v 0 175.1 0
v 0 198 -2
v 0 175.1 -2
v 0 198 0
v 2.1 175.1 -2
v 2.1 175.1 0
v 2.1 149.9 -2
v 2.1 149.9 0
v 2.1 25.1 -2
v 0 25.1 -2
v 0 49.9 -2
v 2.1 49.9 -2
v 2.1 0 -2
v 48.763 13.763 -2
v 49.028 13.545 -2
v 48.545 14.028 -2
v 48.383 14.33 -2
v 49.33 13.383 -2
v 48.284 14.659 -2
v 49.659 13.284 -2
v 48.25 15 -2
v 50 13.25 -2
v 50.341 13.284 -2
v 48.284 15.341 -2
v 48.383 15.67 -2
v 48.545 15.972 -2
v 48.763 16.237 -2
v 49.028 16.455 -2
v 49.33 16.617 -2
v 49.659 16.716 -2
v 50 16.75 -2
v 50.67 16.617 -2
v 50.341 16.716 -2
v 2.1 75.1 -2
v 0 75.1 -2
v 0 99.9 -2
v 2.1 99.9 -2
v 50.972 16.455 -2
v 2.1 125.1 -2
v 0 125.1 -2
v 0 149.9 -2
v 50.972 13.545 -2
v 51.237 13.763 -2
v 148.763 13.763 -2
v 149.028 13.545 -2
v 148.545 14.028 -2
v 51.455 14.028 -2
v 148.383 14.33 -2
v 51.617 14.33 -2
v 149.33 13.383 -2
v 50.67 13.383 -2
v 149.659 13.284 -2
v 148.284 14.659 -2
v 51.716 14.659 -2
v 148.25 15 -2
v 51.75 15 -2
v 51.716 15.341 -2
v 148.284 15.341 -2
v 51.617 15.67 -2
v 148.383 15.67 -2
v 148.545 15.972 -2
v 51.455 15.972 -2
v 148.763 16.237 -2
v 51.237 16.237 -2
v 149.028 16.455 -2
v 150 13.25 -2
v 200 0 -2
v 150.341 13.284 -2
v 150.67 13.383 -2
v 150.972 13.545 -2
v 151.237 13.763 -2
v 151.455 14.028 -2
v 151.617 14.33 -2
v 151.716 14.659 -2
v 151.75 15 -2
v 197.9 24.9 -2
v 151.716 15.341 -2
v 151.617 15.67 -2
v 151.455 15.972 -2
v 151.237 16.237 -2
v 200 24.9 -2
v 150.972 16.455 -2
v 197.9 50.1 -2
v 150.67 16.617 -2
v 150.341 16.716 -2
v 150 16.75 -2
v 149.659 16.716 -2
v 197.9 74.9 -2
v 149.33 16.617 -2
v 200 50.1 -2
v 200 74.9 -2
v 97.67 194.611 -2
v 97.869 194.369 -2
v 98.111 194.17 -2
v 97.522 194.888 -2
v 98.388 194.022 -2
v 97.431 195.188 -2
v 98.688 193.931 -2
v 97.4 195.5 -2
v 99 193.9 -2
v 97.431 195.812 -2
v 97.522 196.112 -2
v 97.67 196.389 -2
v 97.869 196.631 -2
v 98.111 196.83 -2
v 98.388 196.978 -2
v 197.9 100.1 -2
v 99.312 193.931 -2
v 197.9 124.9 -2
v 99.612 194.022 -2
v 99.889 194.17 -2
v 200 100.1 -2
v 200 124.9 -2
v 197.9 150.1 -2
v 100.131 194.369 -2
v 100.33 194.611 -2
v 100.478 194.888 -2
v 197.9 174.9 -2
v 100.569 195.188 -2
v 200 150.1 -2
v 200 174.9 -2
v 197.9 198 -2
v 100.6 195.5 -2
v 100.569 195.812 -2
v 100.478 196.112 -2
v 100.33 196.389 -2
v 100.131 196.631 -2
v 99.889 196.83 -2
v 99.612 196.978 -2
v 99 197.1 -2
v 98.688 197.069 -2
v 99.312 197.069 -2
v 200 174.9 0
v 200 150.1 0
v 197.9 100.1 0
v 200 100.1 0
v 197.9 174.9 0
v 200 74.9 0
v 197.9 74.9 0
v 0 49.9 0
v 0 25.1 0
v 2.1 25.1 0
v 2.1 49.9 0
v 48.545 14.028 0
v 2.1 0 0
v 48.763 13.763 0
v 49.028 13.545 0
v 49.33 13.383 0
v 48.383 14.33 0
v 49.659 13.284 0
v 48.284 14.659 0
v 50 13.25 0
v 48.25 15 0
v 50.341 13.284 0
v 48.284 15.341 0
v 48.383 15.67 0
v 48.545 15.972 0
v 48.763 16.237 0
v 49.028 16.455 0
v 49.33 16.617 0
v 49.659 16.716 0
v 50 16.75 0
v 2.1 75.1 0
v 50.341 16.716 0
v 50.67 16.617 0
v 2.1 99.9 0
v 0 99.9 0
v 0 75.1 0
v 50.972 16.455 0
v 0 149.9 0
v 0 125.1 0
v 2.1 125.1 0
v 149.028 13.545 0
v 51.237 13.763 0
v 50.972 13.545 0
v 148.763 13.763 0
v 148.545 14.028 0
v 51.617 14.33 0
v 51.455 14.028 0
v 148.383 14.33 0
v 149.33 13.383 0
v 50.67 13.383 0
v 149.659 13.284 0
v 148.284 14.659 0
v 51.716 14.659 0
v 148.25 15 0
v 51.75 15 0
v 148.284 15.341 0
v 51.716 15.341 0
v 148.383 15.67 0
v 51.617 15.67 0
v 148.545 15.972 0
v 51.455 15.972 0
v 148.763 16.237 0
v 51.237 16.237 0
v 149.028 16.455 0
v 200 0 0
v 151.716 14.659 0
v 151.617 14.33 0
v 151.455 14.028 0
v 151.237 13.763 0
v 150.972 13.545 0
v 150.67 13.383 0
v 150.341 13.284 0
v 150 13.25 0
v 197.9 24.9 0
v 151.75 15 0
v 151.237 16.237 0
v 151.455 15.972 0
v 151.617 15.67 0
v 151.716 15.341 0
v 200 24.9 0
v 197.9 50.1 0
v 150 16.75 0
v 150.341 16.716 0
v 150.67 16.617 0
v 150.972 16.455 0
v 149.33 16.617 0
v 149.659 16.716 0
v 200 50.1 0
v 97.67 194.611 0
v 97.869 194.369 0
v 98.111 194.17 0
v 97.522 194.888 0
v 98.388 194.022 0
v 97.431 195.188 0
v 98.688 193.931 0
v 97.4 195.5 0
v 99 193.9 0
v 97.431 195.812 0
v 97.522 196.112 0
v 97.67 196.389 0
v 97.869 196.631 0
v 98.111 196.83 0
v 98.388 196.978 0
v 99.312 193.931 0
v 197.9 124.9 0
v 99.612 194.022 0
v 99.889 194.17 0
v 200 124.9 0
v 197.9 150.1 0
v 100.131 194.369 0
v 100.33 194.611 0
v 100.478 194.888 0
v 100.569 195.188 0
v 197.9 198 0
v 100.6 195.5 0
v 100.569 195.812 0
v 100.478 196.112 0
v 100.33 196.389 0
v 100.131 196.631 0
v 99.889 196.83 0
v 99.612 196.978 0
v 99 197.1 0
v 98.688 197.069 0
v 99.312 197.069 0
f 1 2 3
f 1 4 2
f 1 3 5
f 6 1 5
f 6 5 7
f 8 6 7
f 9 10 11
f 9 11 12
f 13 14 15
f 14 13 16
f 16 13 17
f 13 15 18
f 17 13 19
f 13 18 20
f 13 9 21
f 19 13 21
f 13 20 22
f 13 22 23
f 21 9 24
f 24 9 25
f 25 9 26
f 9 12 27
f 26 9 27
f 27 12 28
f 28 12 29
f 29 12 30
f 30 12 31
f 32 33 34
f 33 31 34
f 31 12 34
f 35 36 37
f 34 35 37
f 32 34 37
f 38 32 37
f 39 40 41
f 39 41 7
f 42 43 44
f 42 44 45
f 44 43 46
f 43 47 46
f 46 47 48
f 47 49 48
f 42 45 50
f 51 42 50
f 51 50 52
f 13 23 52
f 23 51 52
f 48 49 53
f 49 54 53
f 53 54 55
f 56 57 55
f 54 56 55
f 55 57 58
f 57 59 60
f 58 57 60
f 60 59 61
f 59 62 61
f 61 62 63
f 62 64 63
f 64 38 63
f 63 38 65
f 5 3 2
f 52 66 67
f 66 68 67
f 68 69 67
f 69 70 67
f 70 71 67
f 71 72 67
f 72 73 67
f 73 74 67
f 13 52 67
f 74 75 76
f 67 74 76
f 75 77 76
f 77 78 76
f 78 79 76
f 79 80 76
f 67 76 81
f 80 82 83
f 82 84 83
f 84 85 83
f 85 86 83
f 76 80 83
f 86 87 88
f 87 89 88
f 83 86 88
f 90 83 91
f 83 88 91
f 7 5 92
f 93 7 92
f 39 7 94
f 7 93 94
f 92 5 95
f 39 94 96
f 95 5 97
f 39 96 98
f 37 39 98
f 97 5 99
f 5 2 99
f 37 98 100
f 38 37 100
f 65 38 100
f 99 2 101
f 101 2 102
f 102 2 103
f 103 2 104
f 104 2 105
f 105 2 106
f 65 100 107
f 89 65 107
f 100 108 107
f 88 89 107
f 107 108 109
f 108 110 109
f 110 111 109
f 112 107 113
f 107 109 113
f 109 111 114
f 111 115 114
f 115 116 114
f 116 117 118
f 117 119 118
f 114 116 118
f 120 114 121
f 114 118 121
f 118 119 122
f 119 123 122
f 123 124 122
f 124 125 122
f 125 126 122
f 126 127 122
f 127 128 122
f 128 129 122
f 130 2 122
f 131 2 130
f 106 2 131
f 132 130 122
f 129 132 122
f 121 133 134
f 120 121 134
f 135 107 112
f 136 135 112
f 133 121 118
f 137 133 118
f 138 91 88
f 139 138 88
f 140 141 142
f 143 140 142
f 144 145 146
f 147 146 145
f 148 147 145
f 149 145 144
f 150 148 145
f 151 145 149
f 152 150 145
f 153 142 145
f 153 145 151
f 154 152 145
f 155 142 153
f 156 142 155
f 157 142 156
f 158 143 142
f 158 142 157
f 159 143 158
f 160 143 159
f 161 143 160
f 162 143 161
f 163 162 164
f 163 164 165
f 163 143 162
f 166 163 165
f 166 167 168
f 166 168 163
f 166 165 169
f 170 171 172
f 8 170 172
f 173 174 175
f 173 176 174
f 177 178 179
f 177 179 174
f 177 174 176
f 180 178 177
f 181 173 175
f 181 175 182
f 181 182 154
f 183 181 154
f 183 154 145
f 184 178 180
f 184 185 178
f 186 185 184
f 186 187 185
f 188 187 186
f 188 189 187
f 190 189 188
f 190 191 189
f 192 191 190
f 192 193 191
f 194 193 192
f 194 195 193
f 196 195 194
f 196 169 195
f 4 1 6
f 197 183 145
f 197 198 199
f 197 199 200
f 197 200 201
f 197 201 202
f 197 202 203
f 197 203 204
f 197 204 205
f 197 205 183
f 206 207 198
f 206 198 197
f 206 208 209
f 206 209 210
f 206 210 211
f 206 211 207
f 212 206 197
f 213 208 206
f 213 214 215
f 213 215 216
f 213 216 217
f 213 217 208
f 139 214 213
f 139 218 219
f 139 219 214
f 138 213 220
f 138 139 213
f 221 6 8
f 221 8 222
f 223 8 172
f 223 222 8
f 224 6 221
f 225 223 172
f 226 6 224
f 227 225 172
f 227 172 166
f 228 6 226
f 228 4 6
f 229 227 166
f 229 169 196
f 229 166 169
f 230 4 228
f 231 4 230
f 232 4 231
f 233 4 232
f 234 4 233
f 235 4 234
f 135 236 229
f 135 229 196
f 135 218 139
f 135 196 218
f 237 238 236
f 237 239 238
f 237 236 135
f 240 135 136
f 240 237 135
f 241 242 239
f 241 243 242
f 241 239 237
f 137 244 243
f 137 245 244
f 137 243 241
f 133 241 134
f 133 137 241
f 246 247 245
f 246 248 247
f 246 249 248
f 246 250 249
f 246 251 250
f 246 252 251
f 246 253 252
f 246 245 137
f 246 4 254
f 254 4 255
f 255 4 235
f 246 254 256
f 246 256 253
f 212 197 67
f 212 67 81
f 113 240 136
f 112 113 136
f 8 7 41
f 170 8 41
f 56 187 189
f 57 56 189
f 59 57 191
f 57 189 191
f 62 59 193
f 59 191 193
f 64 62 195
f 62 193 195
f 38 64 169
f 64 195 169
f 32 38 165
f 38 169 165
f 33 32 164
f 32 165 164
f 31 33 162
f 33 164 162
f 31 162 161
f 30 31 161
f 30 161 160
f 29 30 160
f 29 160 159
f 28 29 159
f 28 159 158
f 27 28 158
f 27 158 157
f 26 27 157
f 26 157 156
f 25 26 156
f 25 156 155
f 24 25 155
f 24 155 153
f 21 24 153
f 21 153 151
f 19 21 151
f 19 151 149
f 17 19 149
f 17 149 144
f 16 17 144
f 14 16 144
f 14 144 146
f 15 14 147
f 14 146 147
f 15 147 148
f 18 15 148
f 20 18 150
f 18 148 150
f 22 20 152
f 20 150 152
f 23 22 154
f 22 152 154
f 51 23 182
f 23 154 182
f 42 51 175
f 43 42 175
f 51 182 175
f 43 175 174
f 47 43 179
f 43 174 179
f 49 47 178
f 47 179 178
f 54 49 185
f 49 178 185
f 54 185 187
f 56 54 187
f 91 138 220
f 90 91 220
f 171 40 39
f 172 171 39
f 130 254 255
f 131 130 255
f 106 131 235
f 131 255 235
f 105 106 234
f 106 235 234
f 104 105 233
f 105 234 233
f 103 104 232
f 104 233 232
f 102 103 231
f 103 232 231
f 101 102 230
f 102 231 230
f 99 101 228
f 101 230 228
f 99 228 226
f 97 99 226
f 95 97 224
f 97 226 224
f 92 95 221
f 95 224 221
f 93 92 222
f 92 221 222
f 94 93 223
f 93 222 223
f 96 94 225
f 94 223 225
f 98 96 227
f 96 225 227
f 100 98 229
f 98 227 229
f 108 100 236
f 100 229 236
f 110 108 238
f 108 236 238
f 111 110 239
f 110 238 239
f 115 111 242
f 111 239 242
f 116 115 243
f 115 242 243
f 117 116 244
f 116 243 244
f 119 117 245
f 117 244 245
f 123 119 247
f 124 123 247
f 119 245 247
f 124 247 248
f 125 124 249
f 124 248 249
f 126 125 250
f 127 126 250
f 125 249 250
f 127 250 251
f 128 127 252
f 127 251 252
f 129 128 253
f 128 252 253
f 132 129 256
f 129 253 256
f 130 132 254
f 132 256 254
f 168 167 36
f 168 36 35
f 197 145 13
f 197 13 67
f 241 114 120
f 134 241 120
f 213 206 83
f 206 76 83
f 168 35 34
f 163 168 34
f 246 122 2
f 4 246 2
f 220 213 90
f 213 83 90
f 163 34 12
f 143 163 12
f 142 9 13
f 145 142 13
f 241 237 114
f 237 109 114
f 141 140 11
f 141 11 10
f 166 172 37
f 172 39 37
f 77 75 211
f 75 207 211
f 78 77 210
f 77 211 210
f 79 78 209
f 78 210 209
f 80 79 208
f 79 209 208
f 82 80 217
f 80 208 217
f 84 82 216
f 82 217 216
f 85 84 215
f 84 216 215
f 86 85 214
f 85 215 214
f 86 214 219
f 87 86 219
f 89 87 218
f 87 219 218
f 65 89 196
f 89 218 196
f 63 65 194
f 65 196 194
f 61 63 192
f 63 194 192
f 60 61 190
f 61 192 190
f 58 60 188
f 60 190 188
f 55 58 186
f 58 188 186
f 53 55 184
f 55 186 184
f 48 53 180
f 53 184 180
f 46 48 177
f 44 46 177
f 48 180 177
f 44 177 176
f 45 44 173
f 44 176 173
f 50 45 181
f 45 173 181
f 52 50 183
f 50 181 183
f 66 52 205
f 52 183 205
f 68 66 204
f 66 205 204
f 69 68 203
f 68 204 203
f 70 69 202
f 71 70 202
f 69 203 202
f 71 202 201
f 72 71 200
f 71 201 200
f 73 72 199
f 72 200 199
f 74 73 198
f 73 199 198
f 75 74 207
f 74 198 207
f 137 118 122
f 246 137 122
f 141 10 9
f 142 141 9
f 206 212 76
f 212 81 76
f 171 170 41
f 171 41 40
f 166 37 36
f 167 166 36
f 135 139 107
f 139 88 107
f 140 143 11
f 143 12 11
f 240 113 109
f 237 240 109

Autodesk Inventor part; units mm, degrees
ref_plane "YZ Plane" through (0, 0, 0) normal (1, 0, 0) x (0, 1, 0)
ref_plane "XZ Plane" through (0, 0, 0) normal (0, 1, 0) x (-1, 0, 0)
ref_plane "XY Plane" through (0, 0, 0) normal (0, 0, 1) x (1, 0, 0)
sketch "Boceto1" plane through (0, 0, 0) normal (0, 0, 1) x (1, 0, 0)
  line L0 (0, 200) -> (0, 175)
  line L1 (0, 175) -> (2, 175)
  line L2 (2, 175) -> (2, 150)
  line L3 (2, 150) -> (0, 150)
  line L4 (0, 150) -> (0, 125)
  line L5 (0, 125) -> (2, 125)
  line L6 (2, 125) -> (2, 100)
  line L7 (2, 100) -> (0, 100)
  line L8 (0, 100) -> (0, 75)
  line L9 (0, 75) -> (2, 75)
  line L10 (2, 75) -> (2, 50)
  line L11 (2, 50) -> (0, 50)
  line L12 (0, 50) -> (0, 25)
  line L13 (2, 25) -> (2, 0)
  line L14 (0, 0) -> (200, 0) projected
  line L15 (0, 200) -> (200, 200) projected
  line L16 (200, 200) -> (198, 200)
  line L17 (198, 200) -> (198, 175)
  line L18 (198, 175) -> (200, 175)
  line L19 (200, 175) -> (200, 150)
  line L20 (200, 150) -> (198, 150)
  line L21 (198, 150) -> (198, 125)
  line L22 (198, 125) -> (200, 125)
  line L23 (200, 125) -> (200, 100)
  line L24 (200, 100) -> (198, 100)
  line L25 (198, 100) -> (198, 75)
  line L26 (198, 75) -> (200, 75)
  line L27 (200, 75) -> (200, 50)
  line L28 (200, 50) -> (198, 50)
  line L29 (198, 50) -> (198, 25)
  line L30 (198, 25) -> (200, 25)
  line L31 (200, 0) -> (200, 25)
  line L32 (0, 25) -> (2, 25)
  dimension "d0" = 25
  dimension "espesor" = 2
  dimension "d3" = 2
  dimension "d5" = 2
  dimension "d6" = 25
  dimension "d7" = 2
  dimension "d8" = 2
  dimension "d9" = 25
  dimension "d10" = 2
  dimension "d15" = 25
  dimension "d34" = 25
  dimension "d35" = 25
  dimension "d36" = 25
  dimension "d37" = 25
  dimension "d38" = 2
  dimension "d39" = 25
  dimension "d40" = 25
  dimension "d41" = 2
  dimension "d42" = 25
  dimension "d43" = 2
  dimension "d44" = 25
  dimension "d45" = 2
  dimension "d46" = 25
  dimension "d47" = 2
  dimension "d48" = 25
  dimension "d49" = 2
  dimension "d50" = 25
  dimension "d51" = 2
  dimension "d52" = 25
  dimension "d53" = 2
extrude "Extrusión1" add sketch "Boceto1" against normal blind 2
sketch "Boceto2" plane through (0, 0, 0) normal (0, 0, 1) x (1, 0, 0)
  line L0 (0, 0) -> (200, 0)
  line L1 (200, 0) -> (200, 200)
  line L2 (200, 200) -> (0, 200)
  line L3 (0, 200) -> (0, 0)
  line L4 (2, 30) -> (198, 30)
  line L5 (2, 30) -> (0, 30)
  line L6 (198, 30) -> (200, 30)
  line L7 (0, 0) -> (0, 15)
  line L8 (0, 15) -> (50, 15)
  line L9 (50, 15) -> (150, 15)
  circle A0 centre (50, 15) radius 1.75
  circle A1 centre (150, 15) radius 1.75
  dimension "d54" = 15
  dimension "d55" = 50
  dimension "d56" = 100
  dimension "d57" = 3.5
  dimension "d58" = 3.5
extrude "Extrusión2" cut sketch "Boceto2" against normal blind 2 contours A1 | A0 L9 L8 | L8 L9 A0
sketch "Boceto4" plane through (0, 0, -2) normal (0, 0, -1) x (-1, 0, 0)
  point P0 (0, 0)
sketch "Boceto5" plane through (0, 0, -2) normal (0, 0, -1) x (-1, 0, 0)
  circle A0 centre (-150, 15) radius 1.75 projected
  circle A1 centre (-50, 15) radius 1.75 projected
  line L0 (-2, 0) -> (-2, 25) projected
  line L1 (-2, 25) -> (0, 25) projected
  line L2 (0, 25) -> (0, 50) projected
  line L3 (0, 50) -> (-2, 50) projected
  line L4 (-2, 50) -> (-2, 75) projected
  line L5 (-2, 75) -> (0, 75) projected
  line L6 (0, 75) -> (0, 100) projected
  line L7 (0, 100) -> (-2, 100) projected
  line L8 (-2, 100) -> (-2, 125) projected
  line L9 (-2, 125) -> (0, 125) projected
  line L10 (0, 125) -> (0, 150) projected
  line L11 (0, 150) -> (-2, 150) projected
  line L12 (-2, 150) -> (-2, 175) projected
  line L13 (-2, 175) -> (0, 175) projected
  line L14 (0, 175) -> (0, 200) projected
  line L15 (0, 200) -> (-198, 200) projected
  line L16 (-198, 200) -> (-198, 175) projected
  line L17 (-198, 175) -> (-200, 175) projected
  line L18 (-200, 175) -> (-200, 150) projected
  line L19 (-200, 150) -> (-198, 150) projected
  line L20 (-198, 150) -> (-198, 125) projected
  line L21 (-198, 125) -> (-200, 125) projected
  line L22 (-200, 125) -> (-200, 100) projected
  line L23 (-200, 100) -> (-198, 100) projected
  line L24 (-198, 100) -> (-198, 75) projected
  line L25 (-198, 75) -> (-200, 75) projected
  line L26 (-200, 75) -> (-200, 50) projected
  line L27 (-200, 50) -> (-198, 50) projected
  line L28 (-198, 50) -> (-198, 25) projected
  line L29 (-198, 25) -> (-200, 25) projected
  line L30 (-200, 25) -> (-200, 0) projected
  line L31 (-200, 0) -> (-2, 0) projected
  line L32 (-198, 200) -> (-198, 198)
  line L33 (-198, 200) -> (-198, 175) projected
  line L34 (-198, 198) -> (0, 198)
  point P0 (0, 0)
  dimension "d74" = 2
extrude "Extrusión3" cut sketch "Boceto5" against normal blind 2 contours L34 L16 L15 L14
sketch "Boceto6" plane through (0, 0, -2) normal (0, 0, -1) x (-1, 0, 0)
  line L0 (0, 198) -> (-198, 198) projected
  line L1 (-198, 198) -> (-198, 175) projected
  line L2 (-198, 175) -> (-200, 175) projected
  line L3 (-200, 175) -> (-200, 150) projected
  line L4 (-200, 150) -> (-198, 150) projected
  line L5 (-198, 150) -> (-198, 125) projected
  line L6 (-198, 125) -> (-200, 125) projected
  line L7 (-200, 125) -> (-200, 100) projected
  line L8 (-200, 100) -> (-198, 100) projected
  line L9 (-198, 100) -> (-198, 75) projected
  line L10 (-198, 75) -> (-200, 75) projected
  line L11 (-200, 75) -> (-200, 50) projected
  line L12 (-200, 50) -> (-198, 50) projected
  line L13 (-198, 50) -> (-198, 25) projected
  line L14 (-198, 25) -> (-200, 25) projected
  line L15 (-200, 25) -> (-200, 0) projected
  line L16 (-200, 0) -> (-2, 0) projected
  line L17 (-2, 0) -> (-2, 25) projected
  line L18 (-2, 25) -> (0, 25) projected
  line L19 (0, 25) -> (0, 50) projected
  line L20 (0, 50) -> (-2, 50) projected
  line L21 (-2, 50) -> (-2, 75) projected
  line L22 (-2, 75) -> (0, 75) projected
  line L23 (0, 75) -> (0, 100) projected
  line L24 (0, 100) -> (-2, 100) projected
  line L25 (-2, 100) -> (-2, 125) projected
  line L26 (-2, 125) -> (0, 125) projected
  line L27 (0, 125) -> (0, 150) projected
  line L28 (0, 150) -> (-2, 150) projected
  line L29 (-2, 150) -> (-2, 175) projected
  line L30 (-2, 175) -> (0, 175) projected
  line L31 (0, 175) -> (0, 198) projected
  circle A0 centre (-50, 15) radius 1.75 projected
  circle A1 centre (-150, 15) radius 1.75 projected
  line L32 (-99, 198) -> (-99, 195.5)
  circle A2 centre (-99, 195.5) radius 1.6
  point P0 (0, 0)
  dimension "d77" = 2.5
  dimension "d78" = 3.2
hole "Agujero2" at (99, 195.5, -2) direction (0, 0, 1) diameter 3.2 end through all
sketch "Boceto7" plane through (0, 0, -2) normal (0, 0, -1) x (-1, 0, 0)
  circle A0 centre (-99, 195.5) radius 1.6 projected
  line L0 (0, 198) -> (-198, 198) projected
  line L1 (-198, 198) -> (-198, 175) projected
  line L2 (-198, 175) -> (-200, 175) projected
  line L3 (-200, 175) -> (-200, 150) projected
  line L4 (-200, 150) -> (-198, 150) projected
  line L5 (-198, 150) -> (-198, 125) projected
  line L6 (-198, 125) -> (-200, 125) projected
  line L7 (-200, 125) -> (-200, 100) projected
  line L8 (-200, 100) -> (-198, 100) projected
  line L9 (-198, 100) -> (-198, 75) projected
  line L10 (-198, 75) -> (-200, 75) projected
  line L11 (-200, 75) -> (-200, 50) projected
  line L12 (-200, 50) -> (-198, 50) projected
  line L13 (-198, 50) -> (-198, 25) projected
  line L14 (-198, 25) -> (-200, 25) projected
  line L15 (-200, 25) -> (-200, 0) projected
  line L16 (-200, 0) -> (-2, 0) projected
  line L17 (-2, 0) -> (-2, 25) projected
  line L18 (-2, 25) -> (0, 25) projected
  line L19 (0, 25) -> (0, 50) projected
  line L20 (0, 50) -> (-2, 50) projected
  line L21 (-2, 50) -> (-2, 75) projected
  line L22 (-2, 75) -> (0, 75) projected
  line L23 (0, 75) -> (0, 100) projected
  line L24 (0, 100) -> (-2, 100) projected
  line L25 (-2, 100) -> (-2, 125) projected
  line L26 (-2, 125) -> (0, 125) projected
  line L27 (0, 125) -> (0, 150) projected
  line L28 (0, 150) -> (-2, 150) projected
  line L29 (-2, 150) -> (-2, 175) projected
  line L30 (-2, 175) -> (0, 175) projected
  line L31 (0, 175) -> (0, 198) projected
  circle A1 centre (-50, 15) radius 1.75 projected
  circle A2 centre (-150, 15) radius 1.75 projected
  line L32 (-200, 24.9) -> (-197.9, 24.9)
  line L33 (-197.9, 24.9) -> (-197.9, 50.1)
  line L34 (-197.9, 50.1) -> (-200, 50.1)
  line L35 (-199.9, 50.1) -> (-199.9, 74.9)
  line L36 (-200, 74.9) -> (-2.1, 74.9)
  line L37 (-197.9, 74.9) -> (-197.9, 100.1)
  line L38 (-197.9, 100.1) -> (-200, 100.1)
  line L39 (-199.9, 100.1) -> (-199.9, 124.9)
  line L40 (-200, 124.9) -> (-197.9, 124.9)
  line L41 (-197.9, 124.9) -> (-197.9, 150.1)
  line L42 (-197.9, 150.1) -> (-200, 150.1)
  line L43 (-199.9, 150.1) -> (-199.9, 174.9)
  line L44 (-200, 174.9) -> (-2.1, 174.9)
  line L45 (-197.9, 174.9) -> (-197.9, 198)
  line L46 (-197.9, 197.9) -> (-0.1, 197.9)
  line L47 (-0.1, 198) -> (-0.1, 175.1)
  line L48 (0, 175.1) -> (-2.1, 175.1)
  line L49 (-2.1, 175.1) -> (-2.1, 149.9)
  line L50 (-2.1, 149.9) -> (0, 149.9)
  line L51 (-0.1, 149.9) -> (-0.1, 125.1)
  line L52 (0, 125.1) -> (-2.1, 125.1)
  line L53 (-2.1, 125.1) -> (-2.1, 99.9)
  line L54 (-2.1, 99.9) -> (0, 99.9)
  line L55 (-0.1, 99.9) -> (-0.1, 75.1)
  line L56 (0, 75.1) -> (-2.1, 75.1)
  line L57 (-2.1, 75.1) -> (-2.1, 49.9)
  line L58 (-2.1, 49.9) -> (0, 49.9)
  line L59 (-0.1, 49.9) -> (-0.1, 25.1)
  line L60 (0, 25.1) -> (-2.1, 25.1)
  line L61 (-2.1, 25.1) -> (-2.1, 0)
  line L62 (-2.1, 0.1) -> (-199.9, 0.1)
  line L63 (-199.9, 0.1) -> (-199.9, 24.9)
  point P0 (0, 0)
  dimension "d86" = 0.1
extrude "Extrusión4" cut sketch "Boceto7" against normal blind 2 contours L31 L30 L29 L28 L27 L50 L49 L48 | L45 L44 L3 L2 L1 L0 | L42 L41 L40 L7 L6 L5 L4 L3 | L27 L26 L25 L24 L23 L54 L53 L52 | L38 L37 L36 L11 L10 L9 L8 L7 | L56 L23 L22 L21 L20 L19 L58 L57 | L34 L33 L32 L15 L14 L13 L12 L11 | L60 L19 L18 L17 L16 L61
equation "\"d0\" = Lengueta"
equation "\"d3\" = espesor"
equation "\"d5\" = espesor"
equation "\"d6\" = Lengueta"
equation "\"d7\" = espesor"
equation "\"d8\" = espesor"
equation "\"d9\" = Lengueta"
equation "\"d10\" = espesor"
equation "\"d15\" = Lengueta"
equation "\"d34\" = Lengueta"
equation "\"d35\" = Lengueta"
equation "\"d36\" = Lengueta"
equation "\"d37\" = Lengueta"
equation "\"d38\" = espesor"
equation "\"d39\" = Lengueta"
equation "\"d40\" = Lengueta"
equation "\"d41\" = espesor"
equation "\"d42\" = Lengueta"
equation "\"d43\" = espesor"
equation "\"d44\" = Lengueta"
equation "\"d45\" = espesor"
equation "\"d46\" = Lengueta"
equation "\"d47\" = espesor"
equation "\"d48\" = Lengueta"
equation "\"d49\" = espesor"
equation "\"d50\" = Lengueta"
equation "\"d51\" = espesor"
equation "\"d52\" = Lengueta"
equation "\"d53\" = espesor"
equation "\"d29\" = espesor"
equation "\"d59\" = espesor"
equation "\"d75\" = espesor"
equation "\"d87\" = espesor"
equation "\"Lengueta\" = 25"
properties part number "Contenedor_Pared_1"
